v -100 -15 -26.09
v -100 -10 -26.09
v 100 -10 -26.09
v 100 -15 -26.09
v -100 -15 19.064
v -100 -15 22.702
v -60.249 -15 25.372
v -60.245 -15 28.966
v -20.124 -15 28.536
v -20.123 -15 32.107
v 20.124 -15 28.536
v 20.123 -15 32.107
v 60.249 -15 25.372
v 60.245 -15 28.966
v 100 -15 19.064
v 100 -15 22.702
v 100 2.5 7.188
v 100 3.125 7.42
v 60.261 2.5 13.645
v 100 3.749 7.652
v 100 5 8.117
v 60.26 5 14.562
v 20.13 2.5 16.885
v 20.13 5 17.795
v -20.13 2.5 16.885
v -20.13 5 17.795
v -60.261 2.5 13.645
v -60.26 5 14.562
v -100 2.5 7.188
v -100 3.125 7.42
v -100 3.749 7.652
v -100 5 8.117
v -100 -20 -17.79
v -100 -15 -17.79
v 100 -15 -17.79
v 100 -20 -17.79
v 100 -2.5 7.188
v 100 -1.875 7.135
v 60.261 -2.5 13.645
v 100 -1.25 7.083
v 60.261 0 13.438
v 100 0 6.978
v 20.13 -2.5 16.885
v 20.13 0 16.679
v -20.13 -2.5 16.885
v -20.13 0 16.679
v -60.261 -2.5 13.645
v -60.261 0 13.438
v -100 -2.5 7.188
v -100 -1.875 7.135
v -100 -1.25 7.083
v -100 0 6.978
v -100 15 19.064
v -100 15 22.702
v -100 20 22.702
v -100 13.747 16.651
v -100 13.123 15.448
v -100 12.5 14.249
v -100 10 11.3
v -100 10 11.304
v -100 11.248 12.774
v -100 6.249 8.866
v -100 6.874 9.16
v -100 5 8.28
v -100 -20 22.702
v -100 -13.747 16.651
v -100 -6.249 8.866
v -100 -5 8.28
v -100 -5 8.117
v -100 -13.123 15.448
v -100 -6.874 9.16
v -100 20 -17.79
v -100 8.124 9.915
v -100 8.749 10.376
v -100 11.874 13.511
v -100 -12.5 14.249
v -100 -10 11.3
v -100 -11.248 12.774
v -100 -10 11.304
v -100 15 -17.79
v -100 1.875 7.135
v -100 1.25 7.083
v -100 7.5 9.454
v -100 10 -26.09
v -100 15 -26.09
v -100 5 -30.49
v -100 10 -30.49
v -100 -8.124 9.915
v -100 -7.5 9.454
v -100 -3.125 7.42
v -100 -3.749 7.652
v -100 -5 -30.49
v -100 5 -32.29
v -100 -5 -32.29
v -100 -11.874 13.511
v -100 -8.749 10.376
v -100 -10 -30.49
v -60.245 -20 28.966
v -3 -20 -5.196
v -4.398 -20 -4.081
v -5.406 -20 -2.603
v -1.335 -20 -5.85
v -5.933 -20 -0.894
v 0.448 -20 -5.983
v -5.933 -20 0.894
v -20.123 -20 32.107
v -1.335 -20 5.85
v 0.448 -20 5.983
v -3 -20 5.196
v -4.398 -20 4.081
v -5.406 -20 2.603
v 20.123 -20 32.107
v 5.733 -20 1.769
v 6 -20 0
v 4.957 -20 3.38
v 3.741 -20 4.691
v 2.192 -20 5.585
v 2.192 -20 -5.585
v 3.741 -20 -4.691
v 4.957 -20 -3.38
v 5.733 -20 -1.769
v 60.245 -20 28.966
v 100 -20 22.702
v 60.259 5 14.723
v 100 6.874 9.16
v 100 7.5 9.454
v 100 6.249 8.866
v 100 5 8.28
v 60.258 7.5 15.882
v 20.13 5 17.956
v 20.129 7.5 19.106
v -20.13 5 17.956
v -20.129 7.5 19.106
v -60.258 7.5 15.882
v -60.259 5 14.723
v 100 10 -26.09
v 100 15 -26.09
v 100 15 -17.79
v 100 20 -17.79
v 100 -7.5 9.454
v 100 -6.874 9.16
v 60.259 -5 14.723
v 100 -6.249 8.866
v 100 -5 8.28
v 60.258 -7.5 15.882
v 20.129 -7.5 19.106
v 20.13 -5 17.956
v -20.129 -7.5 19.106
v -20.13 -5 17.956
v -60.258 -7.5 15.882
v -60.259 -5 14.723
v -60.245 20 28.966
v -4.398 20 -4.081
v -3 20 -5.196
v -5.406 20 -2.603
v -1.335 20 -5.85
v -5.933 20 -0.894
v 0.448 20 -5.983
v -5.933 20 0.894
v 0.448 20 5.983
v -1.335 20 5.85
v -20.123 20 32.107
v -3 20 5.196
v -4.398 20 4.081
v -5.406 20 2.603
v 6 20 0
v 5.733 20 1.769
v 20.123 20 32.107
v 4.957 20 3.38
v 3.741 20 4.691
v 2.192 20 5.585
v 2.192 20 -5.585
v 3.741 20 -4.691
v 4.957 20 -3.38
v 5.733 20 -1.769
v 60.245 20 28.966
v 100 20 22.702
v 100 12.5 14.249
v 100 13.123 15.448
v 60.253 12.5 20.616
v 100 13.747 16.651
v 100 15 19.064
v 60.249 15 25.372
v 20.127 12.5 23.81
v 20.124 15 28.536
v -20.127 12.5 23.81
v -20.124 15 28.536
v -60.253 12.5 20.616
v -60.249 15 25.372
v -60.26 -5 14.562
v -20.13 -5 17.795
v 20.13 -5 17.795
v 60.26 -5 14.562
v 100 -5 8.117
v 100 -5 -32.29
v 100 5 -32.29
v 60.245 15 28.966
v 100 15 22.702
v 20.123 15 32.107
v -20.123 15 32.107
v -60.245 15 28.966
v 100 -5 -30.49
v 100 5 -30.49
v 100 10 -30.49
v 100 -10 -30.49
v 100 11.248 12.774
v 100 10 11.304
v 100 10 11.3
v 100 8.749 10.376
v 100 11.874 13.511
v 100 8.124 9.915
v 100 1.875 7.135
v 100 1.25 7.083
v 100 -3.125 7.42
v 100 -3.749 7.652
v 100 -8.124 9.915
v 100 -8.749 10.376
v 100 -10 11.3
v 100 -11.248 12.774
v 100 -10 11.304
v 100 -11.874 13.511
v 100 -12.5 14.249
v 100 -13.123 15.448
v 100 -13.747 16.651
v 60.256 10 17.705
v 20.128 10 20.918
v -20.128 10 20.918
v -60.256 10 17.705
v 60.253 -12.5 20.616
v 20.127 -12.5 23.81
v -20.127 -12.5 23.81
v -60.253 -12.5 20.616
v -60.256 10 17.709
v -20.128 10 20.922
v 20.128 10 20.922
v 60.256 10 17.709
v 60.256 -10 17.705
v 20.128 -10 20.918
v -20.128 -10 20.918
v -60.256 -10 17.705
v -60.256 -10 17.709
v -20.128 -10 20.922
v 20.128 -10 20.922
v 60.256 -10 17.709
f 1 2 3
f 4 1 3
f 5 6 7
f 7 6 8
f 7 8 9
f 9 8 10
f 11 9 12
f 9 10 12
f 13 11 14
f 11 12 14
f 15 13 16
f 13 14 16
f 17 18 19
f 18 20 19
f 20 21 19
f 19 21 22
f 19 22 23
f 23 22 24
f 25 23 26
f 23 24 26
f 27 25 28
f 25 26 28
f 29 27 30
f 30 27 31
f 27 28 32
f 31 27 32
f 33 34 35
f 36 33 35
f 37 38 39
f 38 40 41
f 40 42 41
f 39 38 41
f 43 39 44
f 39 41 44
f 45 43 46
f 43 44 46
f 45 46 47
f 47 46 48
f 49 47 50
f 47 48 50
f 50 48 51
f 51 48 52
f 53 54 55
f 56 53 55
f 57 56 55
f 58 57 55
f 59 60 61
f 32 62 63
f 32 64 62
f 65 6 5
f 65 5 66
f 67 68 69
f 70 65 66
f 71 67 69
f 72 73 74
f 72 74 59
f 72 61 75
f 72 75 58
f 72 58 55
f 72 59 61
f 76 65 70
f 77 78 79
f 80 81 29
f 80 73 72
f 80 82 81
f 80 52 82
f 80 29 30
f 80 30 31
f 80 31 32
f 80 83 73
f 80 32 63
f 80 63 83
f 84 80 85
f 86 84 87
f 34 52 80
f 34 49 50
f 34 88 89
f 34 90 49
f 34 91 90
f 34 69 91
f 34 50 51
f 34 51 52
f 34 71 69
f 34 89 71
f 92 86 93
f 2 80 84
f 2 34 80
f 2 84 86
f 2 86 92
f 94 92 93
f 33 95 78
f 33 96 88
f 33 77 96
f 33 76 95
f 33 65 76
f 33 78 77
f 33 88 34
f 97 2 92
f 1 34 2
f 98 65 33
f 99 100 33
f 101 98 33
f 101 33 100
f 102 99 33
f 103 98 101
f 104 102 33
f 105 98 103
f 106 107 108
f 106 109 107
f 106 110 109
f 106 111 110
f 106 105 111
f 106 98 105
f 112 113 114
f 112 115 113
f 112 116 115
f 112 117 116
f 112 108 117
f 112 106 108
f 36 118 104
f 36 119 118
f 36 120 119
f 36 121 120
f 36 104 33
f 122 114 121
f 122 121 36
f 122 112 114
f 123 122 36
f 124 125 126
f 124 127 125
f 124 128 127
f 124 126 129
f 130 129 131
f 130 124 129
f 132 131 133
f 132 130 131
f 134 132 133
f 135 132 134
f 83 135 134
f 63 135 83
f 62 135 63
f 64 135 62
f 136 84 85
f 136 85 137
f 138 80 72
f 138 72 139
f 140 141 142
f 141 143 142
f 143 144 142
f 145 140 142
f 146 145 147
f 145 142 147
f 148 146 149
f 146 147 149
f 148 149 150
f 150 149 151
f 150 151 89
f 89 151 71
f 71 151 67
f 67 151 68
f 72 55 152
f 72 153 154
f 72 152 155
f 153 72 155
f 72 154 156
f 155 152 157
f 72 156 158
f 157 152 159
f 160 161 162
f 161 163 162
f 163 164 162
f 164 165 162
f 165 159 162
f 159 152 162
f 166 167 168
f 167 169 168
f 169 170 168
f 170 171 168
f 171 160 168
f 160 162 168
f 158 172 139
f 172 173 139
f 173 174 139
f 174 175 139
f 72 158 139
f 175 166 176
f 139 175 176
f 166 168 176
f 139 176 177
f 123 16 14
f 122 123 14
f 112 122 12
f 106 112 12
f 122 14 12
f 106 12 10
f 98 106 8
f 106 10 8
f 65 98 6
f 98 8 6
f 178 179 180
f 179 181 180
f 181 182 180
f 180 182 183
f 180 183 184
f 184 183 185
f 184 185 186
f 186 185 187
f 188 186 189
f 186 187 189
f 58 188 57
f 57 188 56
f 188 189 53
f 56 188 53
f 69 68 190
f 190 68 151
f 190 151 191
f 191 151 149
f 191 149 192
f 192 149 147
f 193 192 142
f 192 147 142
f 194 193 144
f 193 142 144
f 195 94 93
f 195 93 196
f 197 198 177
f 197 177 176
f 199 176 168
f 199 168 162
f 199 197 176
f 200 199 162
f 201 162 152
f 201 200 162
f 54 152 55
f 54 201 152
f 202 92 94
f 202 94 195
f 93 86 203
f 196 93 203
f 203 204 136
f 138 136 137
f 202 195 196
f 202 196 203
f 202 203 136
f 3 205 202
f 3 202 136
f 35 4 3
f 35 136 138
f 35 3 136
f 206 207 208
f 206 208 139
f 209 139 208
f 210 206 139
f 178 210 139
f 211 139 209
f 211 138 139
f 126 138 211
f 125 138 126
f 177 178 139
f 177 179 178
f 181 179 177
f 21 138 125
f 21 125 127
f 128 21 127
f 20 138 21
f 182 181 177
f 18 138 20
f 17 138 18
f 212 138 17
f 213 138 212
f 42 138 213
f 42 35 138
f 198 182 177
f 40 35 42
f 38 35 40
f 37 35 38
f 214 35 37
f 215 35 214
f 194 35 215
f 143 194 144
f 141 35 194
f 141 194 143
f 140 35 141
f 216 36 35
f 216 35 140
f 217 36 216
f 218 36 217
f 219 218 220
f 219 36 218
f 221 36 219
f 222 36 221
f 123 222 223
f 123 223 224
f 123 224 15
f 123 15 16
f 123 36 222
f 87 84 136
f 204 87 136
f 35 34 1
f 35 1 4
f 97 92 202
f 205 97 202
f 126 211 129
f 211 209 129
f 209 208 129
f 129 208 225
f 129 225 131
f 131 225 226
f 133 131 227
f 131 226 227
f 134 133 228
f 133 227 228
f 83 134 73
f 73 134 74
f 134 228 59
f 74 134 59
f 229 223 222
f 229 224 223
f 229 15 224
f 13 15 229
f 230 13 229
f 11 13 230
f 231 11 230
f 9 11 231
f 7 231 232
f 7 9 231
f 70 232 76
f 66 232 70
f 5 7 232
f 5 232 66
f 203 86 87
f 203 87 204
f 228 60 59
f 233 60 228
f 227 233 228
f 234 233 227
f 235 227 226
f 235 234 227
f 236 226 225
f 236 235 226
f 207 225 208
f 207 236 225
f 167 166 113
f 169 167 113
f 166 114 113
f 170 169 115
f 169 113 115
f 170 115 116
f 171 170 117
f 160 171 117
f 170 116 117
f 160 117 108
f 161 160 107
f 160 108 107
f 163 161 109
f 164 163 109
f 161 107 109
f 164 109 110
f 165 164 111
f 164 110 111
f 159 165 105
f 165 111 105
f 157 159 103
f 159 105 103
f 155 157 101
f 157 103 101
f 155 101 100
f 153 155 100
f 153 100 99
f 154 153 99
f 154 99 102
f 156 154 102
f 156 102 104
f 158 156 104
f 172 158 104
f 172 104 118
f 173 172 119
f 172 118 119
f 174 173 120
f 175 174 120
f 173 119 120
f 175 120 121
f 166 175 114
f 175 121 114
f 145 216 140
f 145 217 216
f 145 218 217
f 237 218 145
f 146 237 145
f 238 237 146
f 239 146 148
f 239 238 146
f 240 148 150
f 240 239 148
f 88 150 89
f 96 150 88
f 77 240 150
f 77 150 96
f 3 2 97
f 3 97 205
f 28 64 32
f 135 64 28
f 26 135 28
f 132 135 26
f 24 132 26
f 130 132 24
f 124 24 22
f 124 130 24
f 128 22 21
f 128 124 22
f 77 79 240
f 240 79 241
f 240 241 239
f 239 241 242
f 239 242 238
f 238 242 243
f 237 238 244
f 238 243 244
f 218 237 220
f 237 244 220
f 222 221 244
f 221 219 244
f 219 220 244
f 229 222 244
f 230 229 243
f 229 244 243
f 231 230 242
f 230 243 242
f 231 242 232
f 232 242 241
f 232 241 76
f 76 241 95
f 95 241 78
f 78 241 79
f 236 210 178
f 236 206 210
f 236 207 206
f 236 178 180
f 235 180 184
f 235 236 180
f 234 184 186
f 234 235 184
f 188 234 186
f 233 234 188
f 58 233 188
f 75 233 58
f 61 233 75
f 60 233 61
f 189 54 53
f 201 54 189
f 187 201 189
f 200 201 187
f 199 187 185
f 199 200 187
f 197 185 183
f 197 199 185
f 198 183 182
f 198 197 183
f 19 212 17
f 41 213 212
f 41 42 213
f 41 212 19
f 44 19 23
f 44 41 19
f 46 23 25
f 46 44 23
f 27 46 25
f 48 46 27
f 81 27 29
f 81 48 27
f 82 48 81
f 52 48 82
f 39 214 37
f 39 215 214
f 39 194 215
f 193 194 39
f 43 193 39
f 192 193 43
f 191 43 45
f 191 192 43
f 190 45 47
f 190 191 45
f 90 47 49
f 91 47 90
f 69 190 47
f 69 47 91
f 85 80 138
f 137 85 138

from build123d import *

# Parameters (mm, degrees)
F0_R      = 6
F1_DEPTH  = 5
F2_R      = 6
F3_DEPTH  = 5
F4_R      = 6
F5_DEPTH  = 5
F6_R      = 6
F7_DEPTH  = 5
F8_SIZE2  = 0.2055374144
F8_SIZE   = 2.5
F9_SIZE2  = 1.149871526
F9_SIZE   = 2.5
F10_SIZE2 = 2.8860789389
F10_SIZE  = 2.5
F11_SIZE2 = 0.909916
F11_SIZE  = 2.49999
F12_SIZE2 = 1.809688
F12_SIZE  = 2.49999
F13_SIZE2 = 4.721668
F13_SIZE  = 2.49999


# Not quite as in the source:
# - a fillet or chamfer is up to 0.001 mm smaller than in the source, because OpenCascade refuses the exact size


with BuildPart() as f1:
    # F0 (on Front) → F1 (new body)
    with BuildSketch(Plane.XZ):
        with BuildLine():
            Line((-100, 7.1879485566), (-100, -32.29))
            Line((-100, -32.29), (100, -32.29))
            Line((100, -32.29), (100, 7.1879485566))
            ThreePointArc((100, 7.1879485566), (0, 17.29), (-100, 7.1879485566))
        make_face()
        Circle(F0_R, mode=Mode.SUBTRACT)
    extrude(amount=F1_DEPTH)

    # F2 (on face) → F3 (join)
    with BuildSketch(Plane.XZ.offset(5)):
        with BuildLine():
            Line((-100, -30.49), (100, -30.49))
            Line((100, -30.49), (100, 9.4535179491))
            ThreePointArc((100, 9.4535179491), (0, 19.51), (-100, 9.4535179491))
            Line((-100, 9.4535179491), (-100, -30.49))
        make_face()
        Circle(F2_R, mode=Mode.SUBTRACT)
    extrude(amount=F3_DEPTH)

    # F4 (on face) → F5 (join)
    with BuildSketch(Plane.XZ.offset(10)):
        with BuildLine():
            Line((-100, -26.09), (100, -26.09))
            Line((100, -26.09), (100, 14.2486365081))
            ThreePointArc((100, 14.2486365081), (0, 24.21), (-100, 14.2486365081))
            Line((-100, 14.2486365081), (-100, -26.09))
        make_face()
        Circle(F4_R, mode=Mode.SUBTRACT)
    extrude(amount=F5_DEPTH)

    # F6 (on face) → F7 (join)
    with BuildSketch(Plane.XZ.offset(15)):
        with BuildLine():
            Line((-100, -17.79), (100, -17.79))
            Line((100, -17.79), (100, 22.7020537739))
            ThreePointArc((100, 22.7020537739), (0, 32.5), (-100, 22.7020537739))
            Line((-100, 22.7020537739), (-100, -17.79))
        make_face()
        Circle(F6_R, mode=Mode.SUBTRACT)
    extrude(amount=F7_DEPTH)

    # F8
    f8_edges = [f1.edges().sort_by_distance(p)[0] for p in [
        (0, 0, 17.29),
    ]]
    f8_side = f1.faces().sort_by_distance((0, -2.5, 17.29))[0]
    chamfer(f8_edges, length=F8_SIZE, length2=F8_SIZE2, reference=f8_side)

    # F9
    f9_edges = [f1.edges().sort_by_distance(p)[0] for p in [
        (0, -5, 19.51),
    ]]
    f9_side = f1.faces().sort_by_distance((0, -7.5, 19.51))[0]
    chamfer(f9_edges, length=F9_SIZE, length2=F9_SIZE2, reference=f9_side)

    # F10
    f10_edges = [f1.edges().sort_by_distance(p)[0] for p in [
        (0, -10, 24.21),
    ]]
    f10_side = f1.faces().sort_by_distance((0, -12.5, 24.21))[0]
    chamfer(f10_edges, length=F10_SIZE, length2=F10_SIZE2, reference=f10_side)

    # F11 (size 2.5 and 0.9099255857 in the source; OpenCascade refuses exactly that, so slightly less here)
    f11_edges = [f1.edges().sort_by_distance(p)[0] for p in [
        (0, -5, 17.29),
    ]]
    f11_side = f1.faces().sort_by_distance((0, -3.75, 17.29))[0]
    chamfer(f11_edges, length=F11_SIZE, length2=F11_SIZE2, reference=f11_side)

    # F12 (size 2.5 and 1.8096981916 in the source; OpenCascade refuses exactly that, so slightly less here)
    f12_edges = [f1.edges().sort_by_distance(p)[0] for p in [
        (0, -10, 19.51),
    ]]
    f12_side = f1.faces().sort_by_distance((0, -8.75, 19.51))[0]
    chamfer(f12_edges, length=F12_SIZE, length2=F12_SIZE2, reference=f12_side)

    # F13 (size 2.5 and 4.7216783541 in the source; OpenCascade refuses exactly that, so slightly less here)
    f13_edges = [f1.edges().sort_by_distance(p)[0] for p in [
        (0, -15, 24.21),
    ]]
    f13_side = f1.faces().sort_by_distance((0, -13.75, 24.21))[0]
    chamfer(f13_edges, length=F13_SIZE, length2=F13_SIZE2, reference=f13_side)

    # F14: F1 across plane


with BuildPart() as f1_1:
    add(f1.part)
    add(f1.part.mirror(Plane.XZ))


solid = f1_1.part
